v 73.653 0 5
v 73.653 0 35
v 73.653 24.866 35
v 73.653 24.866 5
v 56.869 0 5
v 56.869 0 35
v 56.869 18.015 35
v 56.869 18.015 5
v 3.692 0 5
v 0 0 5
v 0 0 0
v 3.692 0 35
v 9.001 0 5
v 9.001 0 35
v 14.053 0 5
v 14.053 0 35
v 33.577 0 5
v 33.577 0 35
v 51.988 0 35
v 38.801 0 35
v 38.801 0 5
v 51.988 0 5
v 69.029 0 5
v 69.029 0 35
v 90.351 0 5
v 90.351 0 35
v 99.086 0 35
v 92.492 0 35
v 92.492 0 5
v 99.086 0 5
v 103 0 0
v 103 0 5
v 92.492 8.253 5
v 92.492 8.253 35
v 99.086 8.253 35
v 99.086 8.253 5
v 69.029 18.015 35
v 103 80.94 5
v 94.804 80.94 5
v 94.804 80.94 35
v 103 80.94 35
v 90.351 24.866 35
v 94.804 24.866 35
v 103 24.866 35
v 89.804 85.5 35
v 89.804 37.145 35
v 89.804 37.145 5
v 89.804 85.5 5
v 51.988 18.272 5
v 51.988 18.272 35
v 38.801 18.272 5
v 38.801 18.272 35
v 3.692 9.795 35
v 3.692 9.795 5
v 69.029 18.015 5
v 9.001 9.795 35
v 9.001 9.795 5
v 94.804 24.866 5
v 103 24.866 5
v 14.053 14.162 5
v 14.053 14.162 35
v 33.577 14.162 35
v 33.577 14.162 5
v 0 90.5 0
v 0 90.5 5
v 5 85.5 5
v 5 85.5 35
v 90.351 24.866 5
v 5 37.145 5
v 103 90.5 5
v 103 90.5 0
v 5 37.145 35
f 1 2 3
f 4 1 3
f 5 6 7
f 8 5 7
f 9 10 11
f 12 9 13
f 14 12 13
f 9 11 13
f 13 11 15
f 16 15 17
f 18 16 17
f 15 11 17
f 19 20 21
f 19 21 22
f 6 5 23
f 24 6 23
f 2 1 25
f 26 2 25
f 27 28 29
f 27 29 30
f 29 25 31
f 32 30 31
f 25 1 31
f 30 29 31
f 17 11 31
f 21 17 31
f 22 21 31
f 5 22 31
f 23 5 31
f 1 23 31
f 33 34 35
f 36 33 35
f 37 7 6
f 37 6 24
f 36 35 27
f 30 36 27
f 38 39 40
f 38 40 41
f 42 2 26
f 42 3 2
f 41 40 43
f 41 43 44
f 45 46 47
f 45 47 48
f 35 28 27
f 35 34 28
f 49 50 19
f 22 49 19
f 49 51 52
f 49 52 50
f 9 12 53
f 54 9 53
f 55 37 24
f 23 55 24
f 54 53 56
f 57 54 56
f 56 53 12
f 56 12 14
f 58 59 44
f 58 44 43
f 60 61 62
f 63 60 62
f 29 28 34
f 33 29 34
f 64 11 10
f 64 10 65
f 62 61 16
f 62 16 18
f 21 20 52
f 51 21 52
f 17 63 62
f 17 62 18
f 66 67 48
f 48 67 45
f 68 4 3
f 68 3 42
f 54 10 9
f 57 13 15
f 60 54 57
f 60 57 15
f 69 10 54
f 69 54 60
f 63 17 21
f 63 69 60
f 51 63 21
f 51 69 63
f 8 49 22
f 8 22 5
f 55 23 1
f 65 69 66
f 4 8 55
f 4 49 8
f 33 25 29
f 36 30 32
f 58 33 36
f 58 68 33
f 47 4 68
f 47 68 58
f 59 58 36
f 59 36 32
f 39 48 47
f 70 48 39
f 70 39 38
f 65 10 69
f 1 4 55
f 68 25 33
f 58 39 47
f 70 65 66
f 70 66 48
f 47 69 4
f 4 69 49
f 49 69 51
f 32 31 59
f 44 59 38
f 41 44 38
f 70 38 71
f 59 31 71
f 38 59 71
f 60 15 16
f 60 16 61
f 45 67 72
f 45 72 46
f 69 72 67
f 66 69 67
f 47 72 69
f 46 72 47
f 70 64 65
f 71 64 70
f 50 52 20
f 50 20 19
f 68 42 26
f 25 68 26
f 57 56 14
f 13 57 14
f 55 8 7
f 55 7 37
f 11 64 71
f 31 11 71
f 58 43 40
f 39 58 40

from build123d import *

# Parameters (mm, degrees)
SKETCH_1_W          = 103
SKETCH_1_H          = 90.5
EXTRUDE_1_DEPTH     = 35
CUT_EXTRUDE_1_DEPTH = 30
SKETCH_3_W          = 84.803967954
SKETCH_3_H          = 48.355269134
CUT_EXTRUDE_2_DEPTH = 30


with BuildPart() as part:
    # 草图1 → 凸台-拉伸1 (new body)
    with BuildSketch(Plane.XY):
        with Locations((51.5, 45.25)):
            Rectangle(SKETCH_1_W, SKETCH_1_H)
    extrude(amount=EXTRUDE_1_DEPTH)

    # 草图2 → 切除-拉伸1 (cut)
    with BuildSketch(Plane.XY.offset(35)):
        Polygon((0, 32.144730866), (0, 0), (3.691599488, 0), (3.691599488, 9.794798376), (9.000778853, 9.794798376), (9.000778853, 0), (14.053062443, 0), (14.053062443, 14.162026564), (33.5771414, 14.162026564), (33.5771414, 0), (38.80068884, 0), (38.80068884, 18.272358976), (51.988005329, 18.272358976), (51.988005329, 0), (56.869025068, 0), (56.869025068, 18.0154632), (69.028758454, 18.0154632), (69.028758454, 0), (73.652882417, 0), (73.652882417, 24.86601722), (90.351107841, 24.86601722), (90.351107841, 0), (92.491905972, 0), (92.491905972, 8.253423721), (99.085564217, 8.253423721), (99.085564217, 0), (103, 0), (103, 24.86601722), (94.803967954, 24.86601722), (94.803967954, 32.144730866), align=None)
    extrude(amount=-CUT_EXTRUDE_1_DEPTH, mode=Mode.SUBTRACT)

    # 草图3 → 切除-拉伸2 (cut)
    with BuildSketch(Plane.XY.offset(35)):
        Polygon((0, 90.5), (0, 32.144730866), (94.803967954, 32.144730866), (94.803967954, 80.939676354), (103, 80.939676354), (103, 90.5), align=None)
        with Locations((47.401983977, 61.322365433)):
            Rectangle(SKETCH_3_W, SKETCH_3_H, mode=Mode.SUBTRACT)
    extrude(amount=-CUT_EXTRUDE_2_DEPTH, mode=Mode.SUBTRACT)


solid = part.part
